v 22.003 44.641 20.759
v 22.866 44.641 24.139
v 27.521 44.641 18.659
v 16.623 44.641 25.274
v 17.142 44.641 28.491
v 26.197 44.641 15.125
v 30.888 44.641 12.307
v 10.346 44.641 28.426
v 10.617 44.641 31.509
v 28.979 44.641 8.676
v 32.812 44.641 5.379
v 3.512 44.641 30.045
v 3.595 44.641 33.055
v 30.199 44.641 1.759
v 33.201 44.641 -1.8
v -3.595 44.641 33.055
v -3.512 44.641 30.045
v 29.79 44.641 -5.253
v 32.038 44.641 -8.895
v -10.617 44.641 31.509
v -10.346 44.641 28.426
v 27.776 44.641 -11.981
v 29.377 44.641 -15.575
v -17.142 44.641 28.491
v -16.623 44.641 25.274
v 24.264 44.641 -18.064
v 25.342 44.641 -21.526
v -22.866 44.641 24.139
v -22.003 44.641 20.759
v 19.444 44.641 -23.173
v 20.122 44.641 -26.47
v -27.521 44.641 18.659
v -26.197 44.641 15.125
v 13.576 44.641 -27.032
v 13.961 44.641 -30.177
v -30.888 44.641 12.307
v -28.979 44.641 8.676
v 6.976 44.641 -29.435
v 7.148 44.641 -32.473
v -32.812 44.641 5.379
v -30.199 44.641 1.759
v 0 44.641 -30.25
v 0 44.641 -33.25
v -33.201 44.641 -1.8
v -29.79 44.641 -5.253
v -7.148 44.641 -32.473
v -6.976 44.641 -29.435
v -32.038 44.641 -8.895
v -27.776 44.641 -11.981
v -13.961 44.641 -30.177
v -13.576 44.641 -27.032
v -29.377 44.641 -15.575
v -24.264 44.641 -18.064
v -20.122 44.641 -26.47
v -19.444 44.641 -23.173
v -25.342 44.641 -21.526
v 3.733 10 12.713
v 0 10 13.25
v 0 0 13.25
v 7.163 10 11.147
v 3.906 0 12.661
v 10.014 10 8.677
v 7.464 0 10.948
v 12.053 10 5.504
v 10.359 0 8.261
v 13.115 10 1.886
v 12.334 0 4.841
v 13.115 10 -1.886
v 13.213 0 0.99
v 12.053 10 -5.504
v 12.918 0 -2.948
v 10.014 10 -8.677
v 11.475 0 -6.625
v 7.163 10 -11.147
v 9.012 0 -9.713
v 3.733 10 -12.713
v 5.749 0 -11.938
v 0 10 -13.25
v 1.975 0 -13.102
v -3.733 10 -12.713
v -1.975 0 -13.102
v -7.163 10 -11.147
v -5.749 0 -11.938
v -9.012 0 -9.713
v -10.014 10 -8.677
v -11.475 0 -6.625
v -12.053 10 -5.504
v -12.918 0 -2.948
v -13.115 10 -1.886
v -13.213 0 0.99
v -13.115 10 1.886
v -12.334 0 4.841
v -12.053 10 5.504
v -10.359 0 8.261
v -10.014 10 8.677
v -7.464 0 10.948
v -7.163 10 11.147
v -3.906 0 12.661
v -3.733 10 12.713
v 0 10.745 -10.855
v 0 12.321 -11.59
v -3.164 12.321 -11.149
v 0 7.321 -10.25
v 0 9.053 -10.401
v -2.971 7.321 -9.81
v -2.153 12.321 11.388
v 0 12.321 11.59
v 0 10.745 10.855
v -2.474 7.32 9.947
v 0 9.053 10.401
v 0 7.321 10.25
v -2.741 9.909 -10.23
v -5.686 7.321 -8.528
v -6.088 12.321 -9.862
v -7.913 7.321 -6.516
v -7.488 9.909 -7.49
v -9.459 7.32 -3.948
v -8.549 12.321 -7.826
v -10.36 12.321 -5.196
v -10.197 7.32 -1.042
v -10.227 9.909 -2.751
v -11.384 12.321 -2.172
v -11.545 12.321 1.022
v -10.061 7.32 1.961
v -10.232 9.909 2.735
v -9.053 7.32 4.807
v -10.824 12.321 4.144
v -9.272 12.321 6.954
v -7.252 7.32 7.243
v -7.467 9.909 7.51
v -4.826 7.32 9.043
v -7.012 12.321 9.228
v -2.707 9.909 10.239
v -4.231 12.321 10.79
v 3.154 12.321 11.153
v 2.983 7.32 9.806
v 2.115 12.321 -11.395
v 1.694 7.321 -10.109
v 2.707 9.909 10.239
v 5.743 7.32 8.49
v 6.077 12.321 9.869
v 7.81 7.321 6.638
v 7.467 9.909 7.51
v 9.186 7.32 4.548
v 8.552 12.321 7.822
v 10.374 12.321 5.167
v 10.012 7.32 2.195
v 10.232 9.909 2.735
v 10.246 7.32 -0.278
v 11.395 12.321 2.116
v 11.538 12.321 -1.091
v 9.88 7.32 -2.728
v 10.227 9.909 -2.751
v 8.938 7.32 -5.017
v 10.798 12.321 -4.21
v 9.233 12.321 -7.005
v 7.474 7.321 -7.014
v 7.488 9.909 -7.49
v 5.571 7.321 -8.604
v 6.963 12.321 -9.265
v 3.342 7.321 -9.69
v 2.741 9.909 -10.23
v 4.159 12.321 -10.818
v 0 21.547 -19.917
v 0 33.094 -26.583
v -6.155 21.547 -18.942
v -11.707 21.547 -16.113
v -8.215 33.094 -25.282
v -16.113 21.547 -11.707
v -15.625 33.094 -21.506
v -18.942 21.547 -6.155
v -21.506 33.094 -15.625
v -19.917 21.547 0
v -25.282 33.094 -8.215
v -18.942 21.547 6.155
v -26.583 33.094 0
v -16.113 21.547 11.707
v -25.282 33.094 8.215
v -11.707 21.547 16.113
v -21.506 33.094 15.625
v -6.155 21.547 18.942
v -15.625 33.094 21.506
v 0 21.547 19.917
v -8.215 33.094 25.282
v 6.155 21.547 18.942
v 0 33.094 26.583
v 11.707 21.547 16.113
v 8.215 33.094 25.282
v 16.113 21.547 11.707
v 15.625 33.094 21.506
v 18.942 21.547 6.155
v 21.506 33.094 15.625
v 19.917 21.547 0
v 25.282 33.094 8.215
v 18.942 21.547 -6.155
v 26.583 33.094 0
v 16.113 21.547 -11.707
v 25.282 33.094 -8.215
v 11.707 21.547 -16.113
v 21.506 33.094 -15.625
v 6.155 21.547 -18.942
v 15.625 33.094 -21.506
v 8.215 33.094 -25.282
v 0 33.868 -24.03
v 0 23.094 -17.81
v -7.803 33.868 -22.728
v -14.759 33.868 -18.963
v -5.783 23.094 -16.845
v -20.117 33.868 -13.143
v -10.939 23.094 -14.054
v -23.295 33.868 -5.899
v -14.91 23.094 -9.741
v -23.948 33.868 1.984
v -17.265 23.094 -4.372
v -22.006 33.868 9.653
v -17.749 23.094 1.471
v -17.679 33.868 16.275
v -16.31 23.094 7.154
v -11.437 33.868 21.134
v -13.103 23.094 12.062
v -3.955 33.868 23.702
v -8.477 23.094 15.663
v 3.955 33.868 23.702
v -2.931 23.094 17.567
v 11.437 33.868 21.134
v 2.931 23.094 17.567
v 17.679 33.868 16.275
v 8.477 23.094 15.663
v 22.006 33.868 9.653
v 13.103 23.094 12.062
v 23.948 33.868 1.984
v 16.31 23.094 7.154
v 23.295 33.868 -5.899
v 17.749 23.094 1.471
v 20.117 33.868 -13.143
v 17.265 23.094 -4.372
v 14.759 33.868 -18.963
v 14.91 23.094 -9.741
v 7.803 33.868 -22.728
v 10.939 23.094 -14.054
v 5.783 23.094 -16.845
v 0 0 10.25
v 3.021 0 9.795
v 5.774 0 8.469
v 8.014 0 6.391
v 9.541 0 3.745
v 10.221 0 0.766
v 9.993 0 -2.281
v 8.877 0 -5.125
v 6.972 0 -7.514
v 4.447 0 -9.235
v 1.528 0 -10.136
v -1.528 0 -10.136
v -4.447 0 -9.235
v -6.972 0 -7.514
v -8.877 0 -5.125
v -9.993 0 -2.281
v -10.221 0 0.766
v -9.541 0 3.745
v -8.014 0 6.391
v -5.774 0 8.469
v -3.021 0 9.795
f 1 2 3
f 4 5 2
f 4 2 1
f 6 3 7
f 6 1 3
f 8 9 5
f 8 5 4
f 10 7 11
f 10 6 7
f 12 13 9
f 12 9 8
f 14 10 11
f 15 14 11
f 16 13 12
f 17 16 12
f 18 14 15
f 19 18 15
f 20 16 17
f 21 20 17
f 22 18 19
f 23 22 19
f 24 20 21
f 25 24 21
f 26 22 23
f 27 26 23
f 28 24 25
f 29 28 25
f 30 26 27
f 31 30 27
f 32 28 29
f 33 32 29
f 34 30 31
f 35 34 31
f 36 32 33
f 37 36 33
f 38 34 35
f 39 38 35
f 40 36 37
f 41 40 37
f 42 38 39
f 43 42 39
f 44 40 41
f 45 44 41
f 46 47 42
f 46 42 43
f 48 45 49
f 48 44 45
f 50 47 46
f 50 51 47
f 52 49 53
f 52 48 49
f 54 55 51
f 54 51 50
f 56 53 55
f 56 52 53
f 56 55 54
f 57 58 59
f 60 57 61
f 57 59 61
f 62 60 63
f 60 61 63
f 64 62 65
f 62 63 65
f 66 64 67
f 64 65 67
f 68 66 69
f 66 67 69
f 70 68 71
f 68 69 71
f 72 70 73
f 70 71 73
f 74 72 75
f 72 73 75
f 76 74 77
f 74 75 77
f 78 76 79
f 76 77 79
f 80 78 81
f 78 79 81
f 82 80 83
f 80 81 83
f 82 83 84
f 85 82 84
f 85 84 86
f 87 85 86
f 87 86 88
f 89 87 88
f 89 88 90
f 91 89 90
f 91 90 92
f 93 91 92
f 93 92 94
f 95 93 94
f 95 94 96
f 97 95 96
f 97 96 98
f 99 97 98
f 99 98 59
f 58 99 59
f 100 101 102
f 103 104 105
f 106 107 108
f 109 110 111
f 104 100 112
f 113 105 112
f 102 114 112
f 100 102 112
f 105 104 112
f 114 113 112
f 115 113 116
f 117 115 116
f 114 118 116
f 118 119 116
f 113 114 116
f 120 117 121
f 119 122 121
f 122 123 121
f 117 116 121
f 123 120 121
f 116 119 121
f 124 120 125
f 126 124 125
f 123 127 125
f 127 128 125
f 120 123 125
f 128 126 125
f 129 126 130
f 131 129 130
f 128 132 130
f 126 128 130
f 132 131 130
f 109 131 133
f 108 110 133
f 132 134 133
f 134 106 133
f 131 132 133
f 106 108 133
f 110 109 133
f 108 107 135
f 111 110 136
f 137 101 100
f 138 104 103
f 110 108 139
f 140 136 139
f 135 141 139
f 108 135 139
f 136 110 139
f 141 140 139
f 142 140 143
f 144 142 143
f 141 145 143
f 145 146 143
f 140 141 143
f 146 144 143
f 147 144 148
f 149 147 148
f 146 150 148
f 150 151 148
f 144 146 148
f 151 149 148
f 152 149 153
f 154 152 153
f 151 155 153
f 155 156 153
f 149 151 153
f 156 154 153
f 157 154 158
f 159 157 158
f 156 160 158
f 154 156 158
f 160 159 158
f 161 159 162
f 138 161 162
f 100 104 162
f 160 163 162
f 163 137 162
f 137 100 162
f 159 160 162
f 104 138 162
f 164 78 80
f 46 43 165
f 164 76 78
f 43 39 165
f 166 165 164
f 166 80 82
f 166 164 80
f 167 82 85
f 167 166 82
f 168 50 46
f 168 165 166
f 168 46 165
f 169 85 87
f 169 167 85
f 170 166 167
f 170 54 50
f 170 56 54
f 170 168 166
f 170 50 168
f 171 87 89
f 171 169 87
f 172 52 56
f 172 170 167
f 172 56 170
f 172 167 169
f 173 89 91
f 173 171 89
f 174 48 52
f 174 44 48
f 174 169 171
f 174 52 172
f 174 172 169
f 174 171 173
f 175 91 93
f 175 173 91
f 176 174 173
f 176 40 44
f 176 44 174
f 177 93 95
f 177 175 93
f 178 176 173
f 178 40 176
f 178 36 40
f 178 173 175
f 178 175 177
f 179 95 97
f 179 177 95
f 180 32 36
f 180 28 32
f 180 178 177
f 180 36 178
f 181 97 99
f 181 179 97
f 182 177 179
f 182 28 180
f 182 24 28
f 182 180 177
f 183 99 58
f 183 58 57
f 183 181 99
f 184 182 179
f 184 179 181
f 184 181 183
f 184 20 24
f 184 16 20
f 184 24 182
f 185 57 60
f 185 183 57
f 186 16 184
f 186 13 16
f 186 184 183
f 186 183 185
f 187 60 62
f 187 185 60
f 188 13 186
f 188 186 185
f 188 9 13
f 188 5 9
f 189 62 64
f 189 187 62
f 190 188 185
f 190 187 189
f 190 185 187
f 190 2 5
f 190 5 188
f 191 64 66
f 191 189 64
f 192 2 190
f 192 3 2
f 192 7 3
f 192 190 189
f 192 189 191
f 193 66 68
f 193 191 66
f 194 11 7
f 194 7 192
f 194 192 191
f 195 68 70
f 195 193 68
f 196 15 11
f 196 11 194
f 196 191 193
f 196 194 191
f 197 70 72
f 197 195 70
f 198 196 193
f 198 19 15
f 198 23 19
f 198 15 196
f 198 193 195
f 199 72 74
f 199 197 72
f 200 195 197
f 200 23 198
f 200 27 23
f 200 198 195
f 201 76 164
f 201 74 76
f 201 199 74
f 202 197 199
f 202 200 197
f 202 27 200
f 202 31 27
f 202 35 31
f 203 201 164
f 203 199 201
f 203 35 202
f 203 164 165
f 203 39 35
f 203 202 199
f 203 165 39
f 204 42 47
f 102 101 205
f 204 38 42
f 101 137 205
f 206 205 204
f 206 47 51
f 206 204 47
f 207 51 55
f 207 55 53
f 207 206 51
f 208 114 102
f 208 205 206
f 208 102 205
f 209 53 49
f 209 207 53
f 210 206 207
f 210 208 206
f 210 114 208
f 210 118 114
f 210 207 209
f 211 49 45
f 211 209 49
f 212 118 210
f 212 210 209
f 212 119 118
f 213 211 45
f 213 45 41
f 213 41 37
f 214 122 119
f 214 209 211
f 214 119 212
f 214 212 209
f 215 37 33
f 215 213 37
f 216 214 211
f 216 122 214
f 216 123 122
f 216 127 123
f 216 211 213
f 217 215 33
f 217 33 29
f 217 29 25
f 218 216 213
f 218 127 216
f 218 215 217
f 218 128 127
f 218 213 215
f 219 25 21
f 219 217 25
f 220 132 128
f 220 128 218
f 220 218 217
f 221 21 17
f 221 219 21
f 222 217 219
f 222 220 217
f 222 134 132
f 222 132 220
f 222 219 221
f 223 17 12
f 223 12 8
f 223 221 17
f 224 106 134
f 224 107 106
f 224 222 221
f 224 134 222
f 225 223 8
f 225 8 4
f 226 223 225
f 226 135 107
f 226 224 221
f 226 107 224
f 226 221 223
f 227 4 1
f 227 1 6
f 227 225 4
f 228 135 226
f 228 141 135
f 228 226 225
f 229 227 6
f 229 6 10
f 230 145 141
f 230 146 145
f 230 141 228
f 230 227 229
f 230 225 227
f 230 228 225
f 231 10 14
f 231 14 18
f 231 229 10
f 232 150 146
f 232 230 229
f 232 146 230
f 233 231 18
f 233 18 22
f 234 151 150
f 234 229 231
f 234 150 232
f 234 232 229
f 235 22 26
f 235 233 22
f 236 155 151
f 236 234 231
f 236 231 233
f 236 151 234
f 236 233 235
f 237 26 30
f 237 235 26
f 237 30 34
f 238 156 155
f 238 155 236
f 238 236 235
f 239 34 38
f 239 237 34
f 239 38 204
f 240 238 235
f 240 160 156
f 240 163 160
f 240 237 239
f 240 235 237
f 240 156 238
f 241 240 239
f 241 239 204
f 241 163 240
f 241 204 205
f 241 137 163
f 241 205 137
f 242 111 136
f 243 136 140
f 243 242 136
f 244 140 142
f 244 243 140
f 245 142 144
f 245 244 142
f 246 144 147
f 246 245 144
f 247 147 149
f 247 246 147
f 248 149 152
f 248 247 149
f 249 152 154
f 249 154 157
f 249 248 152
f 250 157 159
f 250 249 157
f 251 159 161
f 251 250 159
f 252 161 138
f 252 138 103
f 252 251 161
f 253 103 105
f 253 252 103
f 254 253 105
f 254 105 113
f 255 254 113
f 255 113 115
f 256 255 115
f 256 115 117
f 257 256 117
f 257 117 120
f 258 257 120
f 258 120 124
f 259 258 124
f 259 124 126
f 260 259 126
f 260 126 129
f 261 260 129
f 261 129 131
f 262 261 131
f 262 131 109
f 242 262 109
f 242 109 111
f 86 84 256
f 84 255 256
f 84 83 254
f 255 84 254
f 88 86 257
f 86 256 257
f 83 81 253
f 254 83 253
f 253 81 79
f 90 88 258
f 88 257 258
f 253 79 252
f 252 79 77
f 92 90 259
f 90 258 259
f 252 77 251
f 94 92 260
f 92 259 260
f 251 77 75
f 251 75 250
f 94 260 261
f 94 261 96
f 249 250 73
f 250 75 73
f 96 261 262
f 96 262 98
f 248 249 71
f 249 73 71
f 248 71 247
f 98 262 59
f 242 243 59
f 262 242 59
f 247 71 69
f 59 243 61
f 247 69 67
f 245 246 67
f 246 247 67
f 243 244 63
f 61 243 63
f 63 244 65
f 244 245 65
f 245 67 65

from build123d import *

# Parameters (mm, degrees)
SKETCH1_R           = 13.25
SKETCH1_R_2         = 10.25
BOSS_EXTRUDE1_DEPTH = 10
FILLET1_R           = 10


with BuildPart() as part:
    # Sketch1 → Boss-Extrude1 (new body)
    with BuildSketch(Plane(origin=(0, 0, 0), x_dir=(1, 0, 0), z_dir=(0, 1, 0))):
        with Locations(Location((0, 0, 0), (0, 0, 270))):
            Circle(SKETCH1_R)
        with Locations(Location((0, 0, 0), (0, 0, 270))):
            Circle(SKETCH1_R_2, mode=Mode.SUBTRACT)
    extrude(amount=BOSS_EXTRUDE1_DEPTH)

    # Sketch2 → Revolve1 (revolve)
    with BuildSketch(Plane.XY, mode=Mode.PRIVATE) as revolve1_sk:
        Polygon((-13.25, 10), (-33.25, 44.641016151), (-30.25, 44.641016151), (-10.25, 10), align=None)
    revolve(revolve1_sk.sketch.rotate(Axis((0, 0, 0), (0, 1, 0)), 270), axis=Axis((0, 0, 0), (0, 1, 0)))

    # Fillet1
    fillet1_edges = [part.edges().sort_by_distance(p)[0] for p in [
        (-10.25, 10, 0),
    ]]
    fillet(fillet1_edges, radius=FILLET1_R)


solid = part.part
